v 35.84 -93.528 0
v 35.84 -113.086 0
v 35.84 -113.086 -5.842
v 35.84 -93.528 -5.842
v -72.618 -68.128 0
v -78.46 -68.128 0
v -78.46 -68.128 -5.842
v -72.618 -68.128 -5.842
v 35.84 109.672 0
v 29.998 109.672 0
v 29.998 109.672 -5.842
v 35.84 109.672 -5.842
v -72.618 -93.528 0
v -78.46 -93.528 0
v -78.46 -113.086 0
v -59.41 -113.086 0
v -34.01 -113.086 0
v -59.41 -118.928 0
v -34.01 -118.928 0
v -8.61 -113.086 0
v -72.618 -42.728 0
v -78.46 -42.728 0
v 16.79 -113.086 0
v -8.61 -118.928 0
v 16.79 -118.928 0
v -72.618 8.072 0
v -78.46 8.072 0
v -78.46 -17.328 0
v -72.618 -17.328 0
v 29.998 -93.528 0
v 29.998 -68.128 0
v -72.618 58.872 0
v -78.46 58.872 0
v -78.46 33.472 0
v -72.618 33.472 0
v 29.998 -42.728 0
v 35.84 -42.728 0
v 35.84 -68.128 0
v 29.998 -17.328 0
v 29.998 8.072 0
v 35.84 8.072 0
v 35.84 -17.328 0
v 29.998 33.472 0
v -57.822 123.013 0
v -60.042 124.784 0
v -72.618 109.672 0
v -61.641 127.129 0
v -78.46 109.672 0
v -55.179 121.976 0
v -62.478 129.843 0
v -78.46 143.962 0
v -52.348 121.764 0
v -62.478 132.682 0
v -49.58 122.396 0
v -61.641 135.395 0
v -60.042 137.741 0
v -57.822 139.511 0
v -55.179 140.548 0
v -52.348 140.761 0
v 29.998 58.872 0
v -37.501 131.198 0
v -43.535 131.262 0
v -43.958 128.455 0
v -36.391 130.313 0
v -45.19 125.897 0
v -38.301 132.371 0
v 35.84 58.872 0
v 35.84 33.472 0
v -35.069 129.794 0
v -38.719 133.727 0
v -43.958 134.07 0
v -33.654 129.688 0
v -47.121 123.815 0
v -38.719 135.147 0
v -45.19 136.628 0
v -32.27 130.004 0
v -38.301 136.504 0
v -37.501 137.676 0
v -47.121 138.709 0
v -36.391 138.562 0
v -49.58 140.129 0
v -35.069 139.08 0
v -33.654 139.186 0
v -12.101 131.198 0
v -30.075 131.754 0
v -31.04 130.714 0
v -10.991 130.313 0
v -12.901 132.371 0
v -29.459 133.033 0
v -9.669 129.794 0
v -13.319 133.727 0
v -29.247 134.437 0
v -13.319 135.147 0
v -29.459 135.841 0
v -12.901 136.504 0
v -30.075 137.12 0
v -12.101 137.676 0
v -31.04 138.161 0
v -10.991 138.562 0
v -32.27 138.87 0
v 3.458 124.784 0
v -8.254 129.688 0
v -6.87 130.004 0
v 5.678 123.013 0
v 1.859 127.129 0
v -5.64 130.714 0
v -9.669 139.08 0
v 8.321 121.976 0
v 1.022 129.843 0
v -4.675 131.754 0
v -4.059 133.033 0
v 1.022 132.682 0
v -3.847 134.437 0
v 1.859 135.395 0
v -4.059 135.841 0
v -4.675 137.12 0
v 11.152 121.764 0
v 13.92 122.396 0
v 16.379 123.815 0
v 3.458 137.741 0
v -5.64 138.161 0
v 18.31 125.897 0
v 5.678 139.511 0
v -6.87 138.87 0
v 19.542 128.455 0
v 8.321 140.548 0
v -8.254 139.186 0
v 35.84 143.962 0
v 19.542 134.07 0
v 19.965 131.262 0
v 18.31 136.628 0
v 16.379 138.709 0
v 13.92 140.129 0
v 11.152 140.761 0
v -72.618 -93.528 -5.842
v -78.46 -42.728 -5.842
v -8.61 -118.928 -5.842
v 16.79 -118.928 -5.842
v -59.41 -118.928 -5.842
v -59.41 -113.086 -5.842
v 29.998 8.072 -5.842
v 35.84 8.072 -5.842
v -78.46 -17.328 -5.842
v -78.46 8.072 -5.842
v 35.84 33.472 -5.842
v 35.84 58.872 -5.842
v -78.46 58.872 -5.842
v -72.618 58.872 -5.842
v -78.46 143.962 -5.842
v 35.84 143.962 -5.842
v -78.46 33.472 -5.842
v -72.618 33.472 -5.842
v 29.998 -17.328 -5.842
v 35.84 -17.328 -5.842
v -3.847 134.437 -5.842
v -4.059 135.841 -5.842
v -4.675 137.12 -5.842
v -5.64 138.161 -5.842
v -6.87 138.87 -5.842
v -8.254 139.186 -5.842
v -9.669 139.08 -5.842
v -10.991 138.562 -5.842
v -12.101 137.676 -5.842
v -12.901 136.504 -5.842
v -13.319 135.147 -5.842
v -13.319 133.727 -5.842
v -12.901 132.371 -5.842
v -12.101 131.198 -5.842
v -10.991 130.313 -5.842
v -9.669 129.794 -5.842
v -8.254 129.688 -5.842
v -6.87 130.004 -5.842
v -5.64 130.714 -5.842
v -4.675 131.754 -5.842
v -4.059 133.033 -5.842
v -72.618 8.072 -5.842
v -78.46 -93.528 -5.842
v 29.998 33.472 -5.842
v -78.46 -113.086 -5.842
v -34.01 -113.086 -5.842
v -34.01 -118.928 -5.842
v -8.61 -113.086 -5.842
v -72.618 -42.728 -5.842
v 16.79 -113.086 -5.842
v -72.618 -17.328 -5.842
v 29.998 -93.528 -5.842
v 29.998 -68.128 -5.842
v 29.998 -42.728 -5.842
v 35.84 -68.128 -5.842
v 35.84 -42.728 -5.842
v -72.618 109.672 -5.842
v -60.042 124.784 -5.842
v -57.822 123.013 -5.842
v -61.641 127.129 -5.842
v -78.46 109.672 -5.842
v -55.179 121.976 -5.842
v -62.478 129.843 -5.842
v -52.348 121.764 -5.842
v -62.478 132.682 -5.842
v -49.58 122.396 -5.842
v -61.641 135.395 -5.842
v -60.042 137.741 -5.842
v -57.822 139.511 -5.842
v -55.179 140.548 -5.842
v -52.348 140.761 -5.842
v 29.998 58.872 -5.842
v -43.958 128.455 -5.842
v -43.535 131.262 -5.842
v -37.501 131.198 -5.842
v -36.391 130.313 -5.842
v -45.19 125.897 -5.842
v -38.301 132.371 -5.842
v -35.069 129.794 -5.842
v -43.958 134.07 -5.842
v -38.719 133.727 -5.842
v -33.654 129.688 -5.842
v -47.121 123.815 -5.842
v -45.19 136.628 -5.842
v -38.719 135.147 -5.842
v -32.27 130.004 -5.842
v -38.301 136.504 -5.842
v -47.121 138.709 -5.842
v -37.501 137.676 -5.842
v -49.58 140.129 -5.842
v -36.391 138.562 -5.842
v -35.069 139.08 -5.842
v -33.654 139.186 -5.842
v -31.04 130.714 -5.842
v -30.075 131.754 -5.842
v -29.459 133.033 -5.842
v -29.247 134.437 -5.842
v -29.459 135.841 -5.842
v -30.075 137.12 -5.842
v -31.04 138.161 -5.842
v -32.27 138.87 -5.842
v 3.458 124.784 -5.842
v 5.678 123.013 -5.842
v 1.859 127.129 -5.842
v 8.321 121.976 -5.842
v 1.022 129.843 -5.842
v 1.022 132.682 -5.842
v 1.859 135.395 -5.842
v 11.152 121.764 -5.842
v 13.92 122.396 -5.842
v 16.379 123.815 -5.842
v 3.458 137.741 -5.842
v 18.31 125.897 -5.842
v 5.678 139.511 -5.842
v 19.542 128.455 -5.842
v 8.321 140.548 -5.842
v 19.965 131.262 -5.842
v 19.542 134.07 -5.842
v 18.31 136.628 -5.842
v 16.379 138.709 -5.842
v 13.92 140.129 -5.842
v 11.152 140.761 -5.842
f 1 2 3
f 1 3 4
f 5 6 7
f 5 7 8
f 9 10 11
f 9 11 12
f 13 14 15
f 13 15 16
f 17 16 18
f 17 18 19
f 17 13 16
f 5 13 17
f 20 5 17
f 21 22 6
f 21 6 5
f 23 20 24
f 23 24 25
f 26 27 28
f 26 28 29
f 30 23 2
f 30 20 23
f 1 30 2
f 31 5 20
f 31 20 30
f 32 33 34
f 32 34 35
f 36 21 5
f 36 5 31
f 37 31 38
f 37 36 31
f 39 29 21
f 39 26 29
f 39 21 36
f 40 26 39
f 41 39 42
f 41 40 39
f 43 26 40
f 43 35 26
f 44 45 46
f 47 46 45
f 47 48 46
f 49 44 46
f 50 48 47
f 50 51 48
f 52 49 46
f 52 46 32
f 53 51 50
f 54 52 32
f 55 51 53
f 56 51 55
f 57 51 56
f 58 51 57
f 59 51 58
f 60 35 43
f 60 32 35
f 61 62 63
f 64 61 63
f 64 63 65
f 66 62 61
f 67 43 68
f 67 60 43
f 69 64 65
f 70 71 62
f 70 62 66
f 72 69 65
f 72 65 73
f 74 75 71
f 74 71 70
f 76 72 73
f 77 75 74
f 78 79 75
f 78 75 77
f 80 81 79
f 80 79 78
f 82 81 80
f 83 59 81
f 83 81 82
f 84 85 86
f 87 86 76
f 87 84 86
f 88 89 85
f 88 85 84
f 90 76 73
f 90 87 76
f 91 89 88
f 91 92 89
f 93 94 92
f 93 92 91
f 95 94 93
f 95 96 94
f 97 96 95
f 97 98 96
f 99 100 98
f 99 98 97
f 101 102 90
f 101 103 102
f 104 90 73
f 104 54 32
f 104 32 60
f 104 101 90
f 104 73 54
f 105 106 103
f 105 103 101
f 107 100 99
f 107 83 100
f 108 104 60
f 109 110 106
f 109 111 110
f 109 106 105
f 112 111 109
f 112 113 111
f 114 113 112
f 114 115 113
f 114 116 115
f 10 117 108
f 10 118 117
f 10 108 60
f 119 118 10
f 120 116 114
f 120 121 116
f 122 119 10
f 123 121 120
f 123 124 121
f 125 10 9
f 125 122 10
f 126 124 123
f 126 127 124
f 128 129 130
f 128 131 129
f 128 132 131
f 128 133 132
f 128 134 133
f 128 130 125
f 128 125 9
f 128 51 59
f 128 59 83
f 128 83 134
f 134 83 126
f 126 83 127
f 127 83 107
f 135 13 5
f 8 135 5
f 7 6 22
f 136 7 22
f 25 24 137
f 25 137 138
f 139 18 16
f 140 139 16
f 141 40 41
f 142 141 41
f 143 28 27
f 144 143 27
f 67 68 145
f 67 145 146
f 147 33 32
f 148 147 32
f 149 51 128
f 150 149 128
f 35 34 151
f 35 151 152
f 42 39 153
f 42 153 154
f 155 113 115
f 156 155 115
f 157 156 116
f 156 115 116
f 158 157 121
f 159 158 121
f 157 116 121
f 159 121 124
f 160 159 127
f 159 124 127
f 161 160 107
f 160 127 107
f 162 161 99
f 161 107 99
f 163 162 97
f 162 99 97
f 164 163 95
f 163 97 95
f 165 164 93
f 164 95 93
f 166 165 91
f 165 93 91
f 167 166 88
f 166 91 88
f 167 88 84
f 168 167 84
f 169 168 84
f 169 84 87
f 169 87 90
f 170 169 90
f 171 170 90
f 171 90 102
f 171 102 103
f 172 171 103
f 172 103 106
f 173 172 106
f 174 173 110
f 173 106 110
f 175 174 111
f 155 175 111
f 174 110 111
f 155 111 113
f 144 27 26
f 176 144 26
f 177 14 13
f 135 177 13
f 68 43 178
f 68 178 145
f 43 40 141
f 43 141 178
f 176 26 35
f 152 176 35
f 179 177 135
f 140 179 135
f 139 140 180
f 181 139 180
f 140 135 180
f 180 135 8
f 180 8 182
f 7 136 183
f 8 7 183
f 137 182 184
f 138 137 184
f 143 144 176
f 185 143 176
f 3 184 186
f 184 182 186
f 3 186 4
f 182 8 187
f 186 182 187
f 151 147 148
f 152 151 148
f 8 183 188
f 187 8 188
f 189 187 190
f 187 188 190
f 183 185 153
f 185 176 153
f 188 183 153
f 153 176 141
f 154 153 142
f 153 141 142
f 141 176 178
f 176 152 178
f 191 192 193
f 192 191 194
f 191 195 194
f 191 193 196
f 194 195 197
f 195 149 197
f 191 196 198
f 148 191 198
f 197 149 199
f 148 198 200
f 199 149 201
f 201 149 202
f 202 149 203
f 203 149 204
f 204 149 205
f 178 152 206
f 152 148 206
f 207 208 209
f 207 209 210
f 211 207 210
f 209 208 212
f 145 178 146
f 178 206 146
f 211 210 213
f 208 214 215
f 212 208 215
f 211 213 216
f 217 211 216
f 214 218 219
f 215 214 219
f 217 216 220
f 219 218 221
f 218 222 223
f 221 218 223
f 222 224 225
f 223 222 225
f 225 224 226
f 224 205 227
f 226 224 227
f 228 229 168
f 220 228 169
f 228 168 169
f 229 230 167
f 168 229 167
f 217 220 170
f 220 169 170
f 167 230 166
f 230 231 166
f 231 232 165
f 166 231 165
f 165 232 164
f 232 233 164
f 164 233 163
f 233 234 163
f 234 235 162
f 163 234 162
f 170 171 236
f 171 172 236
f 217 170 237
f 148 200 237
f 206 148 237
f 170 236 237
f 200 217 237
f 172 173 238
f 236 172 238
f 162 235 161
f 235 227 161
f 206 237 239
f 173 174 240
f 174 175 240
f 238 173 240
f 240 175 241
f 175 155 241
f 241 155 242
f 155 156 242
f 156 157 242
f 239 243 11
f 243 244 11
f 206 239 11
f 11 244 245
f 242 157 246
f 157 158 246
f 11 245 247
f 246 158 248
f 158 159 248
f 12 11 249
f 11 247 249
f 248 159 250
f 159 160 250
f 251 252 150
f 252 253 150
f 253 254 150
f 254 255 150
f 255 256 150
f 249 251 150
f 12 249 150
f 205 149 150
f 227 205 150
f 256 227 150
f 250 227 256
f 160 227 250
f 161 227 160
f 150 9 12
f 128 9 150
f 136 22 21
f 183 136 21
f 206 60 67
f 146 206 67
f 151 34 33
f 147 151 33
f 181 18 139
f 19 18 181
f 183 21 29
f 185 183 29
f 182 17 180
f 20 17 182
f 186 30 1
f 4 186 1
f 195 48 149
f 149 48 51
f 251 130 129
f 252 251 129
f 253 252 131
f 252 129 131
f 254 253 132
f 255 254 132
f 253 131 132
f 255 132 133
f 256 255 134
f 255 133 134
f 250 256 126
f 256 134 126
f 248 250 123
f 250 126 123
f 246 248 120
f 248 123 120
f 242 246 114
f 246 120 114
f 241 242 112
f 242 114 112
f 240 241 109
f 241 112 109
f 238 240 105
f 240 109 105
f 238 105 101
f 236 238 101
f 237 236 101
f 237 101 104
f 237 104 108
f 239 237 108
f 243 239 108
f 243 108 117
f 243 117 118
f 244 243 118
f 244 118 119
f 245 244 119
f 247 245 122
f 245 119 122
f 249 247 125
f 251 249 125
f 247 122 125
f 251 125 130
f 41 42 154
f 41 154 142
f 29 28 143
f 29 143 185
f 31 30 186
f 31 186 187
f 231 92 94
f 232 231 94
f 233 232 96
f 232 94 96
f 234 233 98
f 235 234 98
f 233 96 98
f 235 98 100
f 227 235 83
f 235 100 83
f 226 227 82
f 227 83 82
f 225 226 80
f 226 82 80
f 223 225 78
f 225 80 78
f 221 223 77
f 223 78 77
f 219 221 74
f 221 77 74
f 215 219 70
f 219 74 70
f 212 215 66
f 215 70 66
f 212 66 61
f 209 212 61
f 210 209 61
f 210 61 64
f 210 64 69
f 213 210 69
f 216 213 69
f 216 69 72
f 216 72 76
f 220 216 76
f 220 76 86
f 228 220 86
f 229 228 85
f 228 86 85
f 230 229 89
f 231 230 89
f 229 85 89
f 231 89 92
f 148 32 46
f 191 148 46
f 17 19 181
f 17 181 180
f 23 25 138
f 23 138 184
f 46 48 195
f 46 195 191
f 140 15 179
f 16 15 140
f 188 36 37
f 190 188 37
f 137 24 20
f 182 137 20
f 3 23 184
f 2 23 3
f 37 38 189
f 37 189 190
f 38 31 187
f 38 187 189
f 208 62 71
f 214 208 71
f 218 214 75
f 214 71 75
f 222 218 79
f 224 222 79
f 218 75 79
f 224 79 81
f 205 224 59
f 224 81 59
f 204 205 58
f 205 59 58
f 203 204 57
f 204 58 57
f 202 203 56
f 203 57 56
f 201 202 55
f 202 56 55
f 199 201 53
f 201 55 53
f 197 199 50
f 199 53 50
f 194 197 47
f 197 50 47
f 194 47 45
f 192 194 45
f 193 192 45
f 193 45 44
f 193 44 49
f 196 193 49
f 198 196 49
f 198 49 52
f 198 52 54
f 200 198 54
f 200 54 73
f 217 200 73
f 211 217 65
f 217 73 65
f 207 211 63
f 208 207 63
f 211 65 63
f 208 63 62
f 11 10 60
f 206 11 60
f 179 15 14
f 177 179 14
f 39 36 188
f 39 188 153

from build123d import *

# Parameters (mm, degrees)
F0_W     = 114.3
F0_H     = 262.89
F1_DEPTH = 5.842
F2_W     = 25.4
F2_H     = 5.842
F2_W_2   = 19.05
F2_W_3   = 5.842
F2_H_2   = 25.4
F3_DEPTH = 5.842
F4_R     = 4.7625
F4_R_2   = 9.525
F5_DEPTH = 5.842


# Not quite as in the source:
# - a feature names something its author has since deleted; it is built from what else it names


with BuildPart() as f1:
    # F0 (on Top) → F1 (new body)
    with BuildSketch(Plane.XY):
        with Locations((-21.309719372, 12.5171500933)):
            Rectangle(F0_W, F0_H)
    extrude(amount=-F1_DEPTH)

    # F2 (on face) → F3 (cut, through all)
    with BuildSketch(Plane.XY):
        with Locations((-21.309719372, -116.0068499067)):
            Rectangle(F2_W, F2_H)
        with Locations((-68.934719372, -116.0068499067)):
            Rectangle(F2_W_2, F2_H)
        with Locations((26.315280628, -116.0068499067)):
            Rectangle(F2_W_2, F2_H)
        with Locations((-75.538719372, -80.8278499067)):
            Rectangle(F2_W_3, F2_H_2)
        with Locations((32.919280628, -80.8278499067)):
            Rectangle(F2_W_3, F2_H_2)
        with Locations((32.919280628, -30.0278499067)):
            Rectangle(F2_W_3, F2_H_2)
        with Locations((-75.538719372, -30.0278499067)):
            Rectangle(F2_W_3, F2_H_2)
        with Locations((-75.538719372, 20.7721500933)):
            Rectangle(F2_W_3, F2_H_2)
        with Locations((32.919280628, 20.7721500933)):
            Rectangle(F2_W_3, F2_H_2)
        with Locations((-75.538719372, 71.5721500933)):
            Rectangle(F2_W_3, F2_H_2)
        with Locations((32.919280628, 71.5721500933)):
            Rectangle(F2_W_3, F2_H_2)
        with Locations((-75.538719372, 96.9721500933)):
            Rectangle(F2_W_3, F2_H_2)
        with Locations((32.919280628, 96.9721500933)):
            Rectangle(F2_W_3, F2_H_2)
    extrude(amount=-F3_DEPTH, mode=Mode.SUBTRACT)

    # F4 (on face) → F5 (cut, through all)
    with BuildSketch(Plane.XY):
        with Locations((-34.009719372, 134.4371500933)):
            Circle(F4_R)
        with Locations((-8.609719372, 134.4371500933)):
            Circle(F4_R)
        with Locations((-53.059719372, 131.2621500933)):
            Circle(F4_R_2)
        with Locations((10.440280628, 131.2621500933)):
            Circle(F4_R_2)
    extrude(amount=-F5_DEPTH, mode=Mode.SUBTRACT)


solid = f1.part
